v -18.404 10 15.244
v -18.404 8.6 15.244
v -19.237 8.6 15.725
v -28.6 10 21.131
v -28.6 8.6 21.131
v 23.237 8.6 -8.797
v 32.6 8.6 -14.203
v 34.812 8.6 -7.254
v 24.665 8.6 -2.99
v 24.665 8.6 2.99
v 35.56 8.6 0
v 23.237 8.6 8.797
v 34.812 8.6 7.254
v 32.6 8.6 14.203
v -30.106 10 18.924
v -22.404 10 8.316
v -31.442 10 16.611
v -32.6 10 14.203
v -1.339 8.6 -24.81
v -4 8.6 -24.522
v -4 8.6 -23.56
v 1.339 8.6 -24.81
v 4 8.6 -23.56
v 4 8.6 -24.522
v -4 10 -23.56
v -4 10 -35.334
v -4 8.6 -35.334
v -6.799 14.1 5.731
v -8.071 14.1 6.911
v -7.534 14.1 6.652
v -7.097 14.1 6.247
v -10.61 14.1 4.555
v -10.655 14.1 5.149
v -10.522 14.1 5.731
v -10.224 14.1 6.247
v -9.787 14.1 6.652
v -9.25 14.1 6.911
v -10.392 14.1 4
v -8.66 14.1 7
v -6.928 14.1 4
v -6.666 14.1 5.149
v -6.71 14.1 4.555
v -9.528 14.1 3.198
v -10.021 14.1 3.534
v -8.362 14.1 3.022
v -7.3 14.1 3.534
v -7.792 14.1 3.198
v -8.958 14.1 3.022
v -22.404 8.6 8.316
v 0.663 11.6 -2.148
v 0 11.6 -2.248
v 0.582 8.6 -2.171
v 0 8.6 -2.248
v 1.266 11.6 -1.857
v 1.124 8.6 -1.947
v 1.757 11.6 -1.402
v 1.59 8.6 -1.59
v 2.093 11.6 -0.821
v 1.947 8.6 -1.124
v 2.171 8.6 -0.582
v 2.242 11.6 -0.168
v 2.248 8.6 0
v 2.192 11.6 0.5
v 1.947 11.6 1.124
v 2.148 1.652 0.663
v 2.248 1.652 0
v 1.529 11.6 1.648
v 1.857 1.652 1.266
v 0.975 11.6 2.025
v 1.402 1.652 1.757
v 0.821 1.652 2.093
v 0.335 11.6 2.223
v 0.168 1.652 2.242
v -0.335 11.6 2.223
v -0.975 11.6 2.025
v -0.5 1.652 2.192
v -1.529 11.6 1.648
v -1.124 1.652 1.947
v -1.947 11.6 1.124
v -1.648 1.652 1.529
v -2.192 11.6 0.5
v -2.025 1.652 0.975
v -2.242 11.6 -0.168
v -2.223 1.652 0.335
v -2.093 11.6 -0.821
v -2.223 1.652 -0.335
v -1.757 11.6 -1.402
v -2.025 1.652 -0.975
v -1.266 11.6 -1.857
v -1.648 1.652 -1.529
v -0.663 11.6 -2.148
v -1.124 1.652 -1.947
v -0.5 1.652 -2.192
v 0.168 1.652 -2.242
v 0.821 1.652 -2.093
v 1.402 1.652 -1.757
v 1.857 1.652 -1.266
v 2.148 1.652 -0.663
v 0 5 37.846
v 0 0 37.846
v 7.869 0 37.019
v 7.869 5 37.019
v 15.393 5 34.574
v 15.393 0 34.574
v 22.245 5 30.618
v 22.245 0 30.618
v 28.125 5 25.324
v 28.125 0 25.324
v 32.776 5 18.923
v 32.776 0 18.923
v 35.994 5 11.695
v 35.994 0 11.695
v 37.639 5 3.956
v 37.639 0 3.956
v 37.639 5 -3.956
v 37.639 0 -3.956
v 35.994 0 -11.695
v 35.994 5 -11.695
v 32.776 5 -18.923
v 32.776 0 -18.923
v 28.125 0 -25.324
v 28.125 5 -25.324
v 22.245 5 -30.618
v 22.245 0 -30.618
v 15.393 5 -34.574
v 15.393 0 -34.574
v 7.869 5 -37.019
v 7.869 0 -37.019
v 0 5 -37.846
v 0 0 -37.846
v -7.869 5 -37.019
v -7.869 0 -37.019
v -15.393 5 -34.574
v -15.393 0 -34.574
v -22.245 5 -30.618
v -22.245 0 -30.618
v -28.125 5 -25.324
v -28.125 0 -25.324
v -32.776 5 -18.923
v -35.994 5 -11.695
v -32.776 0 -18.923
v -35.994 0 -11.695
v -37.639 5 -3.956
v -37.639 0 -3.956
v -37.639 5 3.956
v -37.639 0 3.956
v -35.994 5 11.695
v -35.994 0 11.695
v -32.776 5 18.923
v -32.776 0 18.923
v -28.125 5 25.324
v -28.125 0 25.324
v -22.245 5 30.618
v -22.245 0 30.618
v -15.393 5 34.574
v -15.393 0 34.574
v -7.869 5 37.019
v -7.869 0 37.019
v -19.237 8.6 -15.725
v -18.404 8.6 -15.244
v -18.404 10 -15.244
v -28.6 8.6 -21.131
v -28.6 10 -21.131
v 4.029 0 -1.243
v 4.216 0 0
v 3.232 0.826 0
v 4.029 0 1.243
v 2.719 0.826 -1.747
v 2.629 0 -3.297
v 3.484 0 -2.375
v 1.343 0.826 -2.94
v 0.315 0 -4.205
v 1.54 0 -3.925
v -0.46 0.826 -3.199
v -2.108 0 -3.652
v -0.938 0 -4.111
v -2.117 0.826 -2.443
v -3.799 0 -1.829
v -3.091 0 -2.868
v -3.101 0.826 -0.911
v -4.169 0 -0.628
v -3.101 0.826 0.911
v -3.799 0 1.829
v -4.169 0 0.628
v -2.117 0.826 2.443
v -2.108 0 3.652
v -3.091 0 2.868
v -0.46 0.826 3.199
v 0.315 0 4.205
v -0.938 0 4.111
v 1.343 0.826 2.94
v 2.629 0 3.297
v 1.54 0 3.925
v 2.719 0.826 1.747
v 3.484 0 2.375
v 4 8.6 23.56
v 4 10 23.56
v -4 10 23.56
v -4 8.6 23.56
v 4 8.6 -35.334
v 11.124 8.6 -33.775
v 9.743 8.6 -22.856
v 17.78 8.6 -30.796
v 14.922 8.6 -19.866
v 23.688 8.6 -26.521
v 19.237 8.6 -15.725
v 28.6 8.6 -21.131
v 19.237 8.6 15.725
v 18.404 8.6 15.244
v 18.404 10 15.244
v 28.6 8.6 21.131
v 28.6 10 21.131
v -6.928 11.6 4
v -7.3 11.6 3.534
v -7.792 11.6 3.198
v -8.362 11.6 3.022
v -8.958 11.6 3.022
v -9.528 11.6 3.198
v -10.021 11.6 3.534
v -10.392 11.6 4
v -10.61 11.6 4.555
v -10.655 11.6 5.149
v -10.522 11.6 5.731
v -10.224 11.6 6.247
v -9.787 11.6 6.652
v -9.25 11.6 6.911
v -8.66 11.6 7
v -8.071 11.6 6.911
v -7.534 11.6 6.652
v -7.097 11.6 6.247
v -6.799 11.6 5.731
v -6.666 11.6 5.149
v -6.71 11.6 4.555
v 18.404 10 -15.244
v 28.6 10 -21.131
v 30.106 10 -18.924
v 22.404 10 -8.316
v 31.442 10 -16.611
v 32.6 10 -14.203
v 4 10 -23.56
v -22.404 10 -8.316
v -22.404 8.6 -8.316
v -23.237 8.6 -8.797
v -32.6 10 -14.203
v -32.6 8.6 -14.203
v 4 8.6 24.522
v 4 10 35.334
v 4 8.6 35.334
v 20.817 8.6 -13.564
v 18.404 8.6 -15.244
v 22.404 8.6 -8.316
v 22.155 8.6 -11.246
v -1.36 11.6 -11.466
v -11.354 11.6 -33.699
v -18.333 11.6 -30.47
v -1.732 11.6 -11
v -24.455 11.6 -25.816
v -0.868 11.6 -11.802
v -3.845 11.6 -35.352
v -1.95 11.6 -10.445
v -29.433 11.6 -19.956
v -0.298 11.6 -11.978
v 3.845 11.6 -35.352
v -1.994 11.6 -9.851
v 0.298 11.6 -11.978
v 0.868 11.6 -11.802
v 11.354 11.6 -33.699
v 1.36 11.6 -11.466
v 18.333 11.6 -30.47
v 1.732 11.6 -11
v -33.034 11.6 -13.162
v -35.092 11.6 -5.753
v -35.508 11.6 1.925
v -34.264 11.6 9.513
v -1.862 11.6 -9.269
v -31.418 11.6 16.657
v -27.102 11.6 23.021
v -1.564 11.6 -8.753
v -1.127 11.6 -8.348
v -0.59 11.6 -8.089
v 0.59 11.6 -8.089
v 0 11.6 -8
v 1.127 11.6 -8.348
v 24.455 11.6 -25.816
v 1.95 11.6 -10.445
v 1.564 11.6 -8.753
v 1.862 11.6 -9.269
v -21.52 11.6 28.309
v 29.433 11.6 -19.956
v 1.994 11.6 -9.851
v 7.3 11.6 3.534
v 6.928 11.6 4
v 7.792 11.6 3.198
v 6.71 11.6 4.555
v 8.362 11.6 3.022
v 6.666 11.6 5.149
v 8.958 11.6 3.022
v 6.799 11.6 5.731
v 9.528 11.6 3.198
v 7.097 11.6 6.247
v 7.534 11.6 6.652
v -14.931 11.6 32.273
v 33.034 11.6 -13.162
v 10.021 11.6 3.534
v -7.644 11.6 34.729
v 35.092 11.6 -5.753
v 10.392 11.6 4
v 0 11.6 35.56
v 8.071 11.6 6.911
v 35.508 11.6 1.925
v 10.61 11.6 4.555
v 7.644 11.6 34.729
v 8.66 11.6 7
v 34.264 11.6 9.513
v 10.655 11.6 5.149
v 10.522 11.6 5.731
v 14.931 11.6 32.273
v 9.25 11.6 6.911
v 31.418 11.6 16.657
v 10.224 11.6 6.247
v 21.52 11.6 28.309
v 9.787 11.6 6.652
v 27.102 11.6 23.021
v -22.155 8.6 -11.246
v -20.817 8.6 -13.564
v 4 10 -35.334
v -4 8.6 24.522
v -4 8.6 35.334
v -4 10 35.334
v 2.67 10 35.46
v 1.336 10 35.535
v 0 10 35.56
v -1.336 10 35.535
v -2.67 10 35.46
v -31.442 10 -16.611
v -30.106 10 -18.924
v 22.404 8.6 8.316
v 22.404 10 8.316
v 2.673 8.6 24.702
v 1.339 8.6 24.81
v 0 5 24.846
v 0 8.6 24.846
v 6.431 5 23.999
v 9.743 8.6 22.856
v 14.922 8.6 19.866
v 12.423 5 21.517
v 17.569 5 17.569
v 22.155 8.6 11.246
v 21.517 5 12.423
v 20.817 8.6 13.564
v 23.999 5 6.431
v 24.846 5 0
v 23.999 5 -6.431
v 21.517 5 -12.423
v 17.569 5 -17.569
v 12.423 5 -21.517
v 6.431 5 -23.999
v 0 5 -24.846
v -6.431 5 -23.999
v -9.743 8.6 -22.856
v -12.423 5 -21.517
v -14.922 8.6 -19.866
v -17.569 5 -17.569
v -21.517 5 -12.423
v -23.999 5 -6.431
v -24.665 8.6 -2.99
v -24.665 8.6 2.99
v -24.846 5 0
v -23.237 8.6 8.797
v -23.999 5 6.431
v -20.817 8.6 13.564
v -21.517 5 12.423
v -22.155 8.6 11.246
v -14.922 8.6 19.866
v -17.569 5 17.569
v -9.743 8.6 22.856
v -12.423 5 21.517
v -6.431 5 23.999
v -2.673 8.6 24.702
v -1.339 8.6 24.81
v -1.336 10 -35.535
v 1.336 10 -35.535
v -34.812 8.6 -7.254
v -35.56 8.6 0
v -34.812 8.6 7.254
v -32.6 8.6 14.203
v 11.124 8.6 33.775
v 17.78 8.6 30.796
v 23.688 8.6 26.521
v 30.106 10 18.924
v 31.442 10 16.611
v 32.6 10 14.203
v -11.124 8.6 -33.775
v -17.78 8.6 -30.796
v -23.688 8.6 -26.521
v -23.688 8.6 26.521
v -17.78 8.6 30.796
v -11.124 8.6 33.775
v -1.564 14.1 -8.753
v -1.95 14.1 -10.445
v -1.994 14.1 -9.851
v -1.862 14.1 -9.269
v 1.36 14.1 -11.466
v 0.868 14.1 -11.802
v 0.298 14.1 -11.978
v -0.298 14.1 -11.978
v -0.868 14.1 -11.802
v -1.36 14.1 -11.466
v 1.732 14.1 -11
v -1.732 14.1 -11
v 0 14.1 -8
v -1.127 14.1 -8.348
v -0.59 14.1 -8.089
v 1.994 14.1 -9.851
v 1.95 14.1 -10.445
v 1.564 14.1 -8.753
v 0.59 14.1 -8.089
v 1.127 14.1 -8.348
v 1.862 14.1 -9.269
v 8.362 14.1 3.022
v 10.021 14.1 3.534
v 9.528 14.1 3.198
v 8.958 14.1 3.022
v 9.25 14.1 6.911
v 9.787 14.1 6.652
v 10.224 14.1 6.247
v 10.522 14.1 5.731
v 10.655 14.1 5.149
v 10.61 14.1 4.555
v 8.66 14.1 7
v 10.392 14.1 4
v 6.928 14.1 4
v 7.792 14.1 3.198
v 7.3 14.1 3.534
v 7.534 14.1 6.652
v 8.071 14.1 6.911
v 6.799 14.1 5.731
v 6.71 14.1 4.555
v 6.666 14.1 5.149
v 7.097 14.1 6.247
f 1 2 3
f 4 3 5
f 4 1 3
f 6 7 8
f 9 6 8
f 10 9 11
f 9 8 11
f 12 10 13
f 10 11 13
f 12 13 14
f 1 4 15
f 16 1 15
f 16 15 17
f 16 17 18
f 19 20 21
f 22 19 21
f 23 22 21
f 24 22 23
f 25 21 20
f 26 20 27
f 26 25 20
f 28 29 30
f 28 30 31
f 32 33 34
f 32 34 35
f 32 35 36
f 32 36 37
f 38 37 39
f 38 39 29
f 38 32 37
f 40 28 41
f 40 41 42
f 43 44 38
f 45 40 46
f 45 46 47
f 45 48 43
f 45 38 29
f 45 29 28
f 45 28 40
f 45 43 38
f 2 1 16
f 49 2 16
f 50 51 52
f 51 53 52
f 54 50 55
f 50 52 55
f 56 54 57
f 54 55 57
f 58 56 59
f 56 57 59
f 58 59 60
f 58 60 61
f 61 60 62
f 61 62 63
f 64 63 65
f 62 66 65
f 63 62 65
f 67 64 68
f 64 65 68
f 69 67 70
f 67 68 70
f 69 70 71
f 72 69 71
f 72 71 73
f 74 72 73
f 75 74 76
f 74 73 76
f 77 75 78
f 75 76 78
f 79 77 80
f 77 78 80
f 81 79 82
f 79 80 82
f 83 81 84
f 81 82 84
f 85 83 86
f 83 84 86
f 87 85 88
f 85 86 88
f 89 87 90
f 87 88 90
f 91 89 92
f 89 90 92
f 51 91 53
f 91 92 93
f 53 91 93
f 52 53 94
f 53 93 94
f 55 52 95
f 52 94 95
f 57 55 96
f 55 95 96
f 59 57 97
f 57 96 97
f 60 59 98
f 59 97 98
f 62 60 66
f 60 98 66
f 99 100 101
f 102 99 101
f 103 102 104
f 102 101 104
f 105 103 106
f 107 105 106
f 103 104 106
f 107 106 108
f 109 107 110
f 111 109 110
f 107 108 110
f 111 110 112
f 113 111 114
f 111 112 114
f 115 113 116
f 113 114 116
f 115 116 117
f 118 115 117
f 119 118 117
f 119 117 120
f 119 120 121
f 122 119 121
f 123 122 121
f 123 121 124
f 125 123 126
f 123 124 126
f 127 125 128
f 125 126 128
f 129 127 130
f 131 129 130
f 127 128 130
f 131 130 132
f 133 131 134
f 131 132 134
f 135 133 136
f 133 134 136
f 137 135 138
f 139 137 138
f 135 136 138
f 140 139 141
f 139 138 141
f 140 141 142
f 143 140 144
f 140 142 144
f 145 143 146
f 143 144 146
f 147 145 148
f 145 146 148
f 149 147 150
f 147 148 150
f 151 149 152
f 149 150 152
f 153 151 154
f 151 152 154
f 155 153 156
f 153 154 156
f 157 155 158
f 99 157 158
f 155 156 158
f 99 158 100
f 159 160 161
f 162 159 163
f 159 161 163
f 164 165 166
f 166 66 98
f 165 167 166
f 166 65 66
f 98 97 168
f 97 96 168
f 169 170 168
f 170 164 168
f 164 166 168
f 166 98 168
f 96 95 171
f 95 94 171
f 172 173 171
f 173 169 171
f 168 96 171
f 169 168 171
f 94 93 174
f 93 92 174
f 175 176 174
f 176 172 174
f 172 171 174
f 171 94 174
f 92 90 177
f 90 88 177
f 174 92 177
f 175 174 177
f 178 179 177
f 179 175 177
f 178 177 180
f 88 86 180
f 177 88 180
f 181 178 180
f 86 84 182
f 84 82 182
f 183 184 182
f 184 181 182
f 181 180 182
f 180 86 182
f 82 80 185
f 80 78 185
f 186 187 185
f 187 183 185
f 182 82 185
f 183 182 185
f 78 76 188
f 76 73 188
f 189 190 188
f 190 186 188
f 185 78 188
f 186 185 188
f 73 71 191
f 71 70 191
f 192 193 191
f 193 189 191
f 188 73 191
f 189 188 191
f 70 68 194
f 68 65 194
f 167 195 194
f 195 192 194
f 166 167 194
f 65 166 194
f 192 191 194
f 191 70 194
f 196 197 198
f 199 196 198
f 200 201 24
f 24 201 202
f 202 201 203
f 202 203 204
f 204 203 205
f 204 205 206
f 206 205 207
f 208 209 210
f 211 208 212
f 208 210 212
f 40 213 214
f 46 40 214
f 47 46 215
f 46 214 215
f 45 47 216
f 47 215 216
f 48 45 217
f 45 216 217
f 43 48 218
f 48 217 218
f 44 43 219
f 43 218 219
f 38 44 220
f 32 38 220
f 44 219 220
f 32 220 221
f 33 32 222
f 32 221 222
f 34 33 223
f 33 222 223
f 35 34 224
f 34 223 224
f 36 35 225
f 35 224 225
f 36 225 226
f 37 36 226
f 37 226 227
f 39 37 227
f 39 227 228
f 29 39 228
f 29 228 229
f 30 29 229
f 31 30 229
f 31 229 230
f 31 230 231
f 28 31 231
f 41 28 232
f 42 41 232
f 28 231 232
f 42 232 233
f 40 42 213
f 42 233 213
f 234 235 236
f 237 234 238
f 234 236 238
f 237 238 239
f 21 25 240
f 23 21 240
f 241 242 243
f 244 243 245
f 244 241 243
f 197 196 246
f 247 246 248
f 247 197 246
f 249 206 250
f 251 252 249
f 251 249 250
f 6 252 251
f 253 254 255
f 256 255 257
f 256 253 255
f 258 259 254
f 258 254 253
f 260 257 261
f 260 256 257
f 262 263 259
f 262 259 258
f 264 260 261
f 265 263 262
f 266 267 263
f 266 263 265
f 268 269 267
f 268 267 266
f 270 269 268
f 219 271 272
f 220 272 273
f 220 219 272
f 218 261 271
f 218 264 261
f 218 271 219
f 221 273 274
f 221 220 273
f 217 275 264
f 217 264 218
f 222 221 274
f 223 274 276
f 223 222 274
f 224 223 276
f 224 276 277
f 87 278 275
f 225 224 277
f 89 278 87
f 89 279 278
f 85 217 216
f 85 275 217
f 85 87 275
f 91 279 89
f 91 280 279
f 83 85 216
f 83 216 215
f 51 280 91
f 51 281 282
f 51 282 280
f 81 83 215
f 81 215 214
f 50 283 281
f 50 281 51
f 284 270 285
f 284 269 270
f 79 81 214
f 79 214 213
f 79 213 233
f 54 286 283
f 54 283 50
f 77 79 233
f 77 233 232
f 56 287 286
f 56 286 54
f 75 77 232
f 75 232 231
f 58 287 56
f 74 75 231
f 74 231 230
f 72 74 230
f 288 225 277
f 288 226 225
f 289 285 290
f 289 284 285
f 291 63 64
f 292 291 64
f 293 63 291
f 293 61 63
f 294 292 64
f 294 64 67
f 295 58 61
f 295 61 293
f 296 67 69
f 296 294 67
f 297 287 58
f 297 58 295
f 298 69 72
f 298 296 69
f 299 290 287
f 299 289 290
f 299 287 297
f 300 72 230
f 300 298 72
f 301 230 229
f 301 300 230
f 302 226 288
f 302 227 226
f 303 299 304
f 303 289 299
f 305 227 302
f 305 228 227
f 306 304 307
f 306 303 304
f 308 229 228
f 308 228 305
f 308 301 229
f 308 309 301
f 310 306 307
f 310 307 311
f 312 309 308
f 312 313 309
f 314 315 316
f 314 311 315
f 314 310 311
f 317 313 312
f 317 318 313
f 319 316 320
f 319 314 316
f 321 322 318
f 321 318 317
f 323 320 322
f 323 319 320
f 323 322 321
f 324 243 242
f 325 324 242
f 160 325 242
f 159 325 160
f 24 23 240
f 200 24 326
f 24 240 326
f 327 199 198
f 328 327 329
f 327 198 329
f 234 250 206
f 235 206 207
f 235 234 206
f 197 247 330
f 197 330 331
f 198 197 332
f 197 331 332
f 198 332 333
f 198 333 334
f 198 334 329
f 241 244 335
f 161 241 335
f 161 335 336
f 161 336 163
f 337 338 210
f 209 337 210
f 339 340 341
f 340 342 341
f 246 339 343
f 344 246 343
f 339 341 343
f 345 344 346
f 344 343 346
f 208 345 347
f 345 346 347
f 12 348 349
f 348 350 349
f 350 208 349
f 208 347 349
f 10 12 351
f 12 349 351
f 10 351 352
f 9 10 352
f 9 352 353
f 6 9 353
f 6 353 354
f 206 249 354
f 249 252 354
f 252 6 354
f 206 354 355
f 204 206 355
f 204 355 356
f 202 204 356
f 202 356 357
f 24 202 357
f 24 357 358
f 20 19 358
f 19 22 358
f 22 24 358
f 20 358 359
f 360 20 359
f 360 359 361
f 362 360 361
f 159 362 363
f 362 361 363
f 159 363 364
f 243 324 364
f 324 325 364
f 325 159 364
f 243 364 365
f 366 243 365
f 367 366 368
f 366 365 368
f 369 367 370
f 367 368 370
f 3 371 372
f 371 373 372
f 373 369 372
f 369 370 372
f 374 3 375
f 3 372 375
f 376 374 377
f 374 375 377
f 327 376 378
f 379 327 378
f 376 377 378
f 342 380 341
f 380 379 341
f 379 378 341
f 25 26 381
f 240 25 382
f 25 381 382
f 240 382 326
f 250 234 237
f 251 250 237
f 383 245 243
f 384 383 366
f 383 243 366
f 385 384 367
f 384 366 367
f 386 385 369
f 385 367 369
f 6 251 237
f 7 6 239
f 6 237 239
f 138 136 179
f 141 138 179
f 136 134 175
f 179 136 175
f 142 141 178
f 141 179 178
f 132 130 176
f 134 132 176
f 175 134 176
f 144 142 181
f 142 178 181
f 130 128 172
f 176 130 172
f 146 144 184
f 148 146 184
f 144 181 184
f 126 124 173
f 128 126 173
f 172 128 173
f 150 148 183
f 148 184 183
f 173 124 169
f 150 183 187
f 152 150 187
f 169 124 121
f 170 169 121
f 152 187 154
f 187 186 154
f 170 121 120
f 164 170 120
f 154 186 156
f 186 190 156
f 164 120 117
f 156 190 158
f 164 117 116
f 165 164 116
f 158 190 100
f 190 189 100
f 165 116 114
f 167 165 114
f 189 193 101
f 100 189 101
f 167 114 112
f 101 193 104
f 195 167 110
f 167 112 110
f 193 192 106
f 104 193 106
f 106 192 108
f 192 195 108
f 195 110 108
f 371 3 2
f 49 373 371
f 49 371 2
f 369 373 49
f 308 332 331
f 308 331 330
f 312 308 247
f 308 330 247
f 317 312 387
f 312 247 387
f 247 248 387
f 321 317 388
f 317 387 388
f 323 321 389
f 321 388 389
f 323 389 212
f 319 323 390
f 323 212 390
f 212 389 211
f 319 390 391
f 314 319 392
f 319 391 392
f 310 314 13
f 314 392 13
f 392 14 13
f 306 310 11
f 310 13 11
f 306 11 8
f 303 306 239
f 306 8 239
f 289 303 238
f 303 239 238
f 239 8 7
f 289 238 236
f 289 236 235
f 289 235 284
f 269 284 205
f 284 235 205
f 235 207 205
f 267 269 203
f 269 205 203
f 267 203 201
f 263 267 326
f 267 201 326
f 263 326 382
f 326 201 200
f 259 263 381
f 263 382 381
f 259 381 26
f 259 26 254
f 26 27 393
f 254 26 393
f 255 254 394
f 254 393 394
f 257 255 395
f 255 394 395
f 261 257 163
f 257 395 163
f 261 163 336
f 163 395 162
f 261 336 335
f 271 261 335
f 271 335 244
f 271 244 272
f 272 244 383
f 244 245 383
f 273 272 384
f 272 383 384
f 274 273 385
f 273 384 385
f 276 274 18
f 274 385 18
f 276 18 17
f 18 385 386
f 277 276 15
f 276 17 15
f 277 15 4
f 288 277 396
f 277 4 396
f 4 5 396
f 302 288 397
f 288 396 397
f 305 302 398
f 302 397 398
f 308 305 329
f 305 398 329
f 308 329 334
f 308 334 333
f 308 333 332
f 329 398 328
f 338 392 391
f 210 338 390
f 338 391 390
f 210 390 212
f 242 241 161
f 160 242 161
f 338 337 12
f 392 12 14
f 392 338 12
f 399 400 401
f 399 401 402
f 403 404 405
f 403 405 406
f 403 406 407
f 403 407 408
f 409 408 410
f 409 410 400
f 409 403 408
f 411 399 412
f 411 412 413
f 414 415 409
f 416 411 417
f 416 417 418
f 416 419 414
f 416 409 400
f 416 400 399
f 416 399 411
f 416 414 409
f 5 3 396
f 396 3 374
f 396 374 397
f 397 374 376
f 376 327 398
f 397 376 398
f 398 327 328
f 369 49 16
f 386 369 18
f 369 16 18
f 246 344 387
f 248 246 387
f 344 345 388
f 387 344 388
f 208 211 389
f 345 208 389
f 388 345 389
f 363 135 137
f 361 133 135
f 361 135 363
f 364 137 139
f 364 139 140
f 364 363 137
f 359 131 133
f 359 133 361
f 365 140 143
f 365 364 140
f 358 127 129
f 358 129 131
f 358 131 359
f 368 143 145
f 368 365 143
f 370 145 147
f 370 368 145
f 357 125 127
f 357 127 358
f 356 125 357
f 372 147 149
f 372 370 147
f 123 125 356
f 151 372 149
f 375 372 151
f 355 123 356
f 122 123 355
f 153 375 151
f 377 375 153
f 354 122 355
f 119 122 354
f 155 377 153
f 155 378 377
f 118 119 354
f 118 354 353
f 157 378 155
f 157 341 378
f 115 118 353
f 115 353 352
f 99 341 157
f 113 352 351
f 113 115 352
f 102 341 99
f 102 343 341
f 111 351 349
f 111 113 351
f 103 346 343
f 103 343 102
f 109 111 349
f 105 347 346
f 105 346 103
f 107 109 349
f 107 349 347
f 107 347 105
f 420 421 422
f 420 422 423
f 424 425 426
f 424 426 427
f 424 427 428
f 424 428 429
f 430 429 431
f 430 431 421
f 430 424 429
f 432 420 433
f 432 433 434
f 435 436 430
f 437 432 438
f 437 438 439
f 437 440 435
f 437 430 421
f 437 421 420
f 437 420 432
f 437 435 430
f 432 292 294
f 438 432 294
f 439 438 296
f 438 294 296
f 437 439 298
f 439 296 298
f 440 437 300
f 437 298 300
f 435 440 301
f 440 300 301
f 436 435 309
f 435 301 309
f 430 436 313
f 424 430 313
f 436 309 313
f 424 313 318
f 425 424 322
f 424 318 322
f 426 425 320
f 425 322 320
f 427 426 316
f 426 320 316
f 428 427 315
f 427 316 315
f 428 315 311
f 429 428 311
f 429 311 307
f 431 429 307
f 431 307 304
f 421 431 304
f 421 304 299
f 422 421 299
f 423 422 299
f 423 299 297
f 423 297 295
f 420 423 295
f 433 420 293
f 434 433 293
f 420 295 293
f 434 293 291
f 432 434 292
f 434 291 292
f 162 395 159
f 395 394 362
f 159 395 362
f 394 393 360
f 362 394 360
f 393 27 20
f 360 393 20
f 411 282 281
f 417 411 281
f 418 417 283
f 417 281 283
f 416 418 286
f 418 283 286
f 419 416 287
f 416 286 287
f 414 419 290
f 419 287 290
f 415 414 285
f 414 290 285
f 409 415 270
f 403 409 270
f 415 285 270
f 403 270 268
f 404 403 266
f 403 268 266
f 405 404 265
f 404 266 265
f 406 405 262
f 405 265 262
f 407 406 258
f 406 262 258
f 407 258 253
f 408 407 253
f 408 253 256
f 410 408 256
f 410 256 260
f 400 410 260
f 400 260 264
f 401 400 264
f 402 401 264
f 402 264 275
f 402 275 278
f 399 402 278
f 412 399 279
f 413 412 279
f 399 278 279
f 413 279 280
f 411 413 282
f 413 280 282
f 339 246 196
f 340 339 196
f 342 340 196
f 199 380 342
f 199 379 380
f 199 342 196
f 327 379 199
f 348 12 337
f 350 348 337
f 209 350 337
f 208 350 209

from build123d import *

# Parameters (mm, degrees)
SKETCH1_R                                         = 37.846
BOSS_EXTRUDE1_DEPTH                               = 5
SKETCH2_R                                         = 24.846
BOSS_EXTRUDE2_DEPTH                               = 5
SKETCH3_R                                         = 35.56
BOSS_EXTRUDE3_DEPTH                               = 1.6
SKETCH4_R                                         = 2
BOSS_EXTRUDE4_DEPTH                               = 2.5
CIRPATTERN1_COUNT                                 = 3
CSK_FOR_8_FLAT_HEAD_MACHINE_SCREW_100_D           = 4.4958
CSK_FOR_8_FLAT_HEAD_MACHINE_SCREW_100_CSINK_D     = 8.4328
CSK_FOR_8_FLAT_HEAD_MACHINE_SCREW_100_CSINK_ANGLE = 100
BOSS_EXTRUDE5_START                               = -3
SKETCH7_R                                         = 35.56
BOSS_EXTRUDE5_DEPTH                               = 3
CUT_EXTRUDE1_START                                = -1.6
SKETCH8_W                                         = 8
SKETCH8_H                                         = 12
CUT_EXTRUDE1_DEPTH                                = 1.4
CIRPATTERN2_COUNT                                 = 6
SKETCH9_R                                         = 2.2479
CUT_EXTRUDE2_DEPTH                                = 55.208850126


with BuildPart() as part:
    # Sketch1 → Boss-Extrude1 (new body)
    with BuildSketch(Plane(origin=(0, 0, 0), x_dir=(1, 0, 0), z_dir=(0, 1, 0))):
        with Locations(Location((0, 0, 0), (0, 0, 270))):
            Circle(SKETCH1_R)
    extrude(amount=BOSS_EXTRUDE1_DEPTH)

    # Sketch2 → Boss-Extrude2 (add)
    with BuildSketch(Plane(origin=(0, 5, 0), x_dir=(1, 0, 0), z_dir=(0, 1, 0))):
        with Locations(Location((0, 0, 0), (0, 0, 270))):
            Circle(SKETCH2_R)
    extrude(amount=BOSS_EXTRUDE2_DEPTH)

    # Sketch3 → Boss-Extrude3 (add)
    with BuildSketch(Plane(origin=(0, 10, 0), x_dir=(1, 0, 0), z_dir=(0, 1, 0))):
        with Locations(Location((0, 0, 0), (0, 0, 270))):
            Circle(SKETCH3_R)
    extrude(amount=BOSS_EXTRUDE3_DEPTH)

    # Sketch4 → Boss-Extrude4 (add)
    with BuildSketch(Plane(origin=(0, 11.6, 0), x_dir=(1, 0, 0), z_dir=(0, 1, 0))):
        with Locations(Location((0, 10, 0), (0, 0, 270))):
            Circle(SKETCH4_R)
    boss_extrude4 = extrude(amount=BOSS_EXTRUDE4_DEPTH)

    # CirPattern1: Boss-Extrude4 ×3 about axis
    cirpattern1_axis = Axis((0, 0, 0), (0, 1, 0))
    for i in range(1, CIRPATTERN1_COUNT):
        add(boss_extrude4.rotate(cirpattern1_axis, i * 360 / CIRPATTERN1_COUNT))

    # CSK for #8 Flat Head Machine Screw (100)1 (through all)
    with Locations(Plane(origin=(0, 0, 0), x_dir=(-1, 0, 0), z_dir=(0, -1, 0))):
        with Locations((0, 0)):
            CounterSinkHole(CSK_FOR_8_FLAT_HEAD_MACHINE_SCREW_100_D / 2, CSK_FOR_8_FLAT_HEAD_MACHINE_SCREW_100_CSINK_D / 2, counter_sink_angle=CSK_FOR_8_FLAT_HEAD_MACHINE_SCREW_100_CSINK_ANGLE)

    # Sketch7 → Boss-Extrude5 (add)
    with BuildSketch(Plane(origin=(0, 11.6, 0), x_dir=(1, 0, 0), z_dir=(0, 1, 0)).offset(BOSS_EXTRUDE5_START)):
        with Locations(Location((0, 0, 0), (0, 0, 270))):
            Circle(SKETCH7_R)
    extrude(amount=BOSS_EXTRUDE5_DEPTH)

    # Sketch8 → Cut-Extrude1 (cut)
    with BuildSketch(Plane(origin=(0, 11.6, 0), x_dir=(1, 0, 0), z_dir=(0, 1, 0)).offset(CUT_EXTRUDE1_START)):
        with Locations((0, 29.56)):
            Rectangle(SKETCH8_W, SKETCH8_H)
    cut_extrude1 = extrude(amount=-CUT_EXTRUDE1_DEPTH, mode=Mode.SUBTRACT)

    # CirPattern2: Cut-Extrude1 ×6 about axis
    cirpattern2_axis = Axis((0, 0, 0), (0, 1, 0))
    for i in range(1, CIRPATTERN2_COUNT):
        add(cut_extrude1.rotate(cirpattern2_axis, i * 360 / CIRPATTERN2_COUNT), mode=Mode.SUBTRACT)

    # Sketch9 → Cut-Extrude2 (cut, through all)
    with BuildSketch(Plane.XZ.offset(-8.6)):
        with Locations(Location((0, 0, 0), (0, 0, 270))):
            Circle(SKETCH9_R)
    extrude(amount=-CUT_EXTRUDE2_DEPTH, mode=Mode.SUBTRACT)


solid = part.part
